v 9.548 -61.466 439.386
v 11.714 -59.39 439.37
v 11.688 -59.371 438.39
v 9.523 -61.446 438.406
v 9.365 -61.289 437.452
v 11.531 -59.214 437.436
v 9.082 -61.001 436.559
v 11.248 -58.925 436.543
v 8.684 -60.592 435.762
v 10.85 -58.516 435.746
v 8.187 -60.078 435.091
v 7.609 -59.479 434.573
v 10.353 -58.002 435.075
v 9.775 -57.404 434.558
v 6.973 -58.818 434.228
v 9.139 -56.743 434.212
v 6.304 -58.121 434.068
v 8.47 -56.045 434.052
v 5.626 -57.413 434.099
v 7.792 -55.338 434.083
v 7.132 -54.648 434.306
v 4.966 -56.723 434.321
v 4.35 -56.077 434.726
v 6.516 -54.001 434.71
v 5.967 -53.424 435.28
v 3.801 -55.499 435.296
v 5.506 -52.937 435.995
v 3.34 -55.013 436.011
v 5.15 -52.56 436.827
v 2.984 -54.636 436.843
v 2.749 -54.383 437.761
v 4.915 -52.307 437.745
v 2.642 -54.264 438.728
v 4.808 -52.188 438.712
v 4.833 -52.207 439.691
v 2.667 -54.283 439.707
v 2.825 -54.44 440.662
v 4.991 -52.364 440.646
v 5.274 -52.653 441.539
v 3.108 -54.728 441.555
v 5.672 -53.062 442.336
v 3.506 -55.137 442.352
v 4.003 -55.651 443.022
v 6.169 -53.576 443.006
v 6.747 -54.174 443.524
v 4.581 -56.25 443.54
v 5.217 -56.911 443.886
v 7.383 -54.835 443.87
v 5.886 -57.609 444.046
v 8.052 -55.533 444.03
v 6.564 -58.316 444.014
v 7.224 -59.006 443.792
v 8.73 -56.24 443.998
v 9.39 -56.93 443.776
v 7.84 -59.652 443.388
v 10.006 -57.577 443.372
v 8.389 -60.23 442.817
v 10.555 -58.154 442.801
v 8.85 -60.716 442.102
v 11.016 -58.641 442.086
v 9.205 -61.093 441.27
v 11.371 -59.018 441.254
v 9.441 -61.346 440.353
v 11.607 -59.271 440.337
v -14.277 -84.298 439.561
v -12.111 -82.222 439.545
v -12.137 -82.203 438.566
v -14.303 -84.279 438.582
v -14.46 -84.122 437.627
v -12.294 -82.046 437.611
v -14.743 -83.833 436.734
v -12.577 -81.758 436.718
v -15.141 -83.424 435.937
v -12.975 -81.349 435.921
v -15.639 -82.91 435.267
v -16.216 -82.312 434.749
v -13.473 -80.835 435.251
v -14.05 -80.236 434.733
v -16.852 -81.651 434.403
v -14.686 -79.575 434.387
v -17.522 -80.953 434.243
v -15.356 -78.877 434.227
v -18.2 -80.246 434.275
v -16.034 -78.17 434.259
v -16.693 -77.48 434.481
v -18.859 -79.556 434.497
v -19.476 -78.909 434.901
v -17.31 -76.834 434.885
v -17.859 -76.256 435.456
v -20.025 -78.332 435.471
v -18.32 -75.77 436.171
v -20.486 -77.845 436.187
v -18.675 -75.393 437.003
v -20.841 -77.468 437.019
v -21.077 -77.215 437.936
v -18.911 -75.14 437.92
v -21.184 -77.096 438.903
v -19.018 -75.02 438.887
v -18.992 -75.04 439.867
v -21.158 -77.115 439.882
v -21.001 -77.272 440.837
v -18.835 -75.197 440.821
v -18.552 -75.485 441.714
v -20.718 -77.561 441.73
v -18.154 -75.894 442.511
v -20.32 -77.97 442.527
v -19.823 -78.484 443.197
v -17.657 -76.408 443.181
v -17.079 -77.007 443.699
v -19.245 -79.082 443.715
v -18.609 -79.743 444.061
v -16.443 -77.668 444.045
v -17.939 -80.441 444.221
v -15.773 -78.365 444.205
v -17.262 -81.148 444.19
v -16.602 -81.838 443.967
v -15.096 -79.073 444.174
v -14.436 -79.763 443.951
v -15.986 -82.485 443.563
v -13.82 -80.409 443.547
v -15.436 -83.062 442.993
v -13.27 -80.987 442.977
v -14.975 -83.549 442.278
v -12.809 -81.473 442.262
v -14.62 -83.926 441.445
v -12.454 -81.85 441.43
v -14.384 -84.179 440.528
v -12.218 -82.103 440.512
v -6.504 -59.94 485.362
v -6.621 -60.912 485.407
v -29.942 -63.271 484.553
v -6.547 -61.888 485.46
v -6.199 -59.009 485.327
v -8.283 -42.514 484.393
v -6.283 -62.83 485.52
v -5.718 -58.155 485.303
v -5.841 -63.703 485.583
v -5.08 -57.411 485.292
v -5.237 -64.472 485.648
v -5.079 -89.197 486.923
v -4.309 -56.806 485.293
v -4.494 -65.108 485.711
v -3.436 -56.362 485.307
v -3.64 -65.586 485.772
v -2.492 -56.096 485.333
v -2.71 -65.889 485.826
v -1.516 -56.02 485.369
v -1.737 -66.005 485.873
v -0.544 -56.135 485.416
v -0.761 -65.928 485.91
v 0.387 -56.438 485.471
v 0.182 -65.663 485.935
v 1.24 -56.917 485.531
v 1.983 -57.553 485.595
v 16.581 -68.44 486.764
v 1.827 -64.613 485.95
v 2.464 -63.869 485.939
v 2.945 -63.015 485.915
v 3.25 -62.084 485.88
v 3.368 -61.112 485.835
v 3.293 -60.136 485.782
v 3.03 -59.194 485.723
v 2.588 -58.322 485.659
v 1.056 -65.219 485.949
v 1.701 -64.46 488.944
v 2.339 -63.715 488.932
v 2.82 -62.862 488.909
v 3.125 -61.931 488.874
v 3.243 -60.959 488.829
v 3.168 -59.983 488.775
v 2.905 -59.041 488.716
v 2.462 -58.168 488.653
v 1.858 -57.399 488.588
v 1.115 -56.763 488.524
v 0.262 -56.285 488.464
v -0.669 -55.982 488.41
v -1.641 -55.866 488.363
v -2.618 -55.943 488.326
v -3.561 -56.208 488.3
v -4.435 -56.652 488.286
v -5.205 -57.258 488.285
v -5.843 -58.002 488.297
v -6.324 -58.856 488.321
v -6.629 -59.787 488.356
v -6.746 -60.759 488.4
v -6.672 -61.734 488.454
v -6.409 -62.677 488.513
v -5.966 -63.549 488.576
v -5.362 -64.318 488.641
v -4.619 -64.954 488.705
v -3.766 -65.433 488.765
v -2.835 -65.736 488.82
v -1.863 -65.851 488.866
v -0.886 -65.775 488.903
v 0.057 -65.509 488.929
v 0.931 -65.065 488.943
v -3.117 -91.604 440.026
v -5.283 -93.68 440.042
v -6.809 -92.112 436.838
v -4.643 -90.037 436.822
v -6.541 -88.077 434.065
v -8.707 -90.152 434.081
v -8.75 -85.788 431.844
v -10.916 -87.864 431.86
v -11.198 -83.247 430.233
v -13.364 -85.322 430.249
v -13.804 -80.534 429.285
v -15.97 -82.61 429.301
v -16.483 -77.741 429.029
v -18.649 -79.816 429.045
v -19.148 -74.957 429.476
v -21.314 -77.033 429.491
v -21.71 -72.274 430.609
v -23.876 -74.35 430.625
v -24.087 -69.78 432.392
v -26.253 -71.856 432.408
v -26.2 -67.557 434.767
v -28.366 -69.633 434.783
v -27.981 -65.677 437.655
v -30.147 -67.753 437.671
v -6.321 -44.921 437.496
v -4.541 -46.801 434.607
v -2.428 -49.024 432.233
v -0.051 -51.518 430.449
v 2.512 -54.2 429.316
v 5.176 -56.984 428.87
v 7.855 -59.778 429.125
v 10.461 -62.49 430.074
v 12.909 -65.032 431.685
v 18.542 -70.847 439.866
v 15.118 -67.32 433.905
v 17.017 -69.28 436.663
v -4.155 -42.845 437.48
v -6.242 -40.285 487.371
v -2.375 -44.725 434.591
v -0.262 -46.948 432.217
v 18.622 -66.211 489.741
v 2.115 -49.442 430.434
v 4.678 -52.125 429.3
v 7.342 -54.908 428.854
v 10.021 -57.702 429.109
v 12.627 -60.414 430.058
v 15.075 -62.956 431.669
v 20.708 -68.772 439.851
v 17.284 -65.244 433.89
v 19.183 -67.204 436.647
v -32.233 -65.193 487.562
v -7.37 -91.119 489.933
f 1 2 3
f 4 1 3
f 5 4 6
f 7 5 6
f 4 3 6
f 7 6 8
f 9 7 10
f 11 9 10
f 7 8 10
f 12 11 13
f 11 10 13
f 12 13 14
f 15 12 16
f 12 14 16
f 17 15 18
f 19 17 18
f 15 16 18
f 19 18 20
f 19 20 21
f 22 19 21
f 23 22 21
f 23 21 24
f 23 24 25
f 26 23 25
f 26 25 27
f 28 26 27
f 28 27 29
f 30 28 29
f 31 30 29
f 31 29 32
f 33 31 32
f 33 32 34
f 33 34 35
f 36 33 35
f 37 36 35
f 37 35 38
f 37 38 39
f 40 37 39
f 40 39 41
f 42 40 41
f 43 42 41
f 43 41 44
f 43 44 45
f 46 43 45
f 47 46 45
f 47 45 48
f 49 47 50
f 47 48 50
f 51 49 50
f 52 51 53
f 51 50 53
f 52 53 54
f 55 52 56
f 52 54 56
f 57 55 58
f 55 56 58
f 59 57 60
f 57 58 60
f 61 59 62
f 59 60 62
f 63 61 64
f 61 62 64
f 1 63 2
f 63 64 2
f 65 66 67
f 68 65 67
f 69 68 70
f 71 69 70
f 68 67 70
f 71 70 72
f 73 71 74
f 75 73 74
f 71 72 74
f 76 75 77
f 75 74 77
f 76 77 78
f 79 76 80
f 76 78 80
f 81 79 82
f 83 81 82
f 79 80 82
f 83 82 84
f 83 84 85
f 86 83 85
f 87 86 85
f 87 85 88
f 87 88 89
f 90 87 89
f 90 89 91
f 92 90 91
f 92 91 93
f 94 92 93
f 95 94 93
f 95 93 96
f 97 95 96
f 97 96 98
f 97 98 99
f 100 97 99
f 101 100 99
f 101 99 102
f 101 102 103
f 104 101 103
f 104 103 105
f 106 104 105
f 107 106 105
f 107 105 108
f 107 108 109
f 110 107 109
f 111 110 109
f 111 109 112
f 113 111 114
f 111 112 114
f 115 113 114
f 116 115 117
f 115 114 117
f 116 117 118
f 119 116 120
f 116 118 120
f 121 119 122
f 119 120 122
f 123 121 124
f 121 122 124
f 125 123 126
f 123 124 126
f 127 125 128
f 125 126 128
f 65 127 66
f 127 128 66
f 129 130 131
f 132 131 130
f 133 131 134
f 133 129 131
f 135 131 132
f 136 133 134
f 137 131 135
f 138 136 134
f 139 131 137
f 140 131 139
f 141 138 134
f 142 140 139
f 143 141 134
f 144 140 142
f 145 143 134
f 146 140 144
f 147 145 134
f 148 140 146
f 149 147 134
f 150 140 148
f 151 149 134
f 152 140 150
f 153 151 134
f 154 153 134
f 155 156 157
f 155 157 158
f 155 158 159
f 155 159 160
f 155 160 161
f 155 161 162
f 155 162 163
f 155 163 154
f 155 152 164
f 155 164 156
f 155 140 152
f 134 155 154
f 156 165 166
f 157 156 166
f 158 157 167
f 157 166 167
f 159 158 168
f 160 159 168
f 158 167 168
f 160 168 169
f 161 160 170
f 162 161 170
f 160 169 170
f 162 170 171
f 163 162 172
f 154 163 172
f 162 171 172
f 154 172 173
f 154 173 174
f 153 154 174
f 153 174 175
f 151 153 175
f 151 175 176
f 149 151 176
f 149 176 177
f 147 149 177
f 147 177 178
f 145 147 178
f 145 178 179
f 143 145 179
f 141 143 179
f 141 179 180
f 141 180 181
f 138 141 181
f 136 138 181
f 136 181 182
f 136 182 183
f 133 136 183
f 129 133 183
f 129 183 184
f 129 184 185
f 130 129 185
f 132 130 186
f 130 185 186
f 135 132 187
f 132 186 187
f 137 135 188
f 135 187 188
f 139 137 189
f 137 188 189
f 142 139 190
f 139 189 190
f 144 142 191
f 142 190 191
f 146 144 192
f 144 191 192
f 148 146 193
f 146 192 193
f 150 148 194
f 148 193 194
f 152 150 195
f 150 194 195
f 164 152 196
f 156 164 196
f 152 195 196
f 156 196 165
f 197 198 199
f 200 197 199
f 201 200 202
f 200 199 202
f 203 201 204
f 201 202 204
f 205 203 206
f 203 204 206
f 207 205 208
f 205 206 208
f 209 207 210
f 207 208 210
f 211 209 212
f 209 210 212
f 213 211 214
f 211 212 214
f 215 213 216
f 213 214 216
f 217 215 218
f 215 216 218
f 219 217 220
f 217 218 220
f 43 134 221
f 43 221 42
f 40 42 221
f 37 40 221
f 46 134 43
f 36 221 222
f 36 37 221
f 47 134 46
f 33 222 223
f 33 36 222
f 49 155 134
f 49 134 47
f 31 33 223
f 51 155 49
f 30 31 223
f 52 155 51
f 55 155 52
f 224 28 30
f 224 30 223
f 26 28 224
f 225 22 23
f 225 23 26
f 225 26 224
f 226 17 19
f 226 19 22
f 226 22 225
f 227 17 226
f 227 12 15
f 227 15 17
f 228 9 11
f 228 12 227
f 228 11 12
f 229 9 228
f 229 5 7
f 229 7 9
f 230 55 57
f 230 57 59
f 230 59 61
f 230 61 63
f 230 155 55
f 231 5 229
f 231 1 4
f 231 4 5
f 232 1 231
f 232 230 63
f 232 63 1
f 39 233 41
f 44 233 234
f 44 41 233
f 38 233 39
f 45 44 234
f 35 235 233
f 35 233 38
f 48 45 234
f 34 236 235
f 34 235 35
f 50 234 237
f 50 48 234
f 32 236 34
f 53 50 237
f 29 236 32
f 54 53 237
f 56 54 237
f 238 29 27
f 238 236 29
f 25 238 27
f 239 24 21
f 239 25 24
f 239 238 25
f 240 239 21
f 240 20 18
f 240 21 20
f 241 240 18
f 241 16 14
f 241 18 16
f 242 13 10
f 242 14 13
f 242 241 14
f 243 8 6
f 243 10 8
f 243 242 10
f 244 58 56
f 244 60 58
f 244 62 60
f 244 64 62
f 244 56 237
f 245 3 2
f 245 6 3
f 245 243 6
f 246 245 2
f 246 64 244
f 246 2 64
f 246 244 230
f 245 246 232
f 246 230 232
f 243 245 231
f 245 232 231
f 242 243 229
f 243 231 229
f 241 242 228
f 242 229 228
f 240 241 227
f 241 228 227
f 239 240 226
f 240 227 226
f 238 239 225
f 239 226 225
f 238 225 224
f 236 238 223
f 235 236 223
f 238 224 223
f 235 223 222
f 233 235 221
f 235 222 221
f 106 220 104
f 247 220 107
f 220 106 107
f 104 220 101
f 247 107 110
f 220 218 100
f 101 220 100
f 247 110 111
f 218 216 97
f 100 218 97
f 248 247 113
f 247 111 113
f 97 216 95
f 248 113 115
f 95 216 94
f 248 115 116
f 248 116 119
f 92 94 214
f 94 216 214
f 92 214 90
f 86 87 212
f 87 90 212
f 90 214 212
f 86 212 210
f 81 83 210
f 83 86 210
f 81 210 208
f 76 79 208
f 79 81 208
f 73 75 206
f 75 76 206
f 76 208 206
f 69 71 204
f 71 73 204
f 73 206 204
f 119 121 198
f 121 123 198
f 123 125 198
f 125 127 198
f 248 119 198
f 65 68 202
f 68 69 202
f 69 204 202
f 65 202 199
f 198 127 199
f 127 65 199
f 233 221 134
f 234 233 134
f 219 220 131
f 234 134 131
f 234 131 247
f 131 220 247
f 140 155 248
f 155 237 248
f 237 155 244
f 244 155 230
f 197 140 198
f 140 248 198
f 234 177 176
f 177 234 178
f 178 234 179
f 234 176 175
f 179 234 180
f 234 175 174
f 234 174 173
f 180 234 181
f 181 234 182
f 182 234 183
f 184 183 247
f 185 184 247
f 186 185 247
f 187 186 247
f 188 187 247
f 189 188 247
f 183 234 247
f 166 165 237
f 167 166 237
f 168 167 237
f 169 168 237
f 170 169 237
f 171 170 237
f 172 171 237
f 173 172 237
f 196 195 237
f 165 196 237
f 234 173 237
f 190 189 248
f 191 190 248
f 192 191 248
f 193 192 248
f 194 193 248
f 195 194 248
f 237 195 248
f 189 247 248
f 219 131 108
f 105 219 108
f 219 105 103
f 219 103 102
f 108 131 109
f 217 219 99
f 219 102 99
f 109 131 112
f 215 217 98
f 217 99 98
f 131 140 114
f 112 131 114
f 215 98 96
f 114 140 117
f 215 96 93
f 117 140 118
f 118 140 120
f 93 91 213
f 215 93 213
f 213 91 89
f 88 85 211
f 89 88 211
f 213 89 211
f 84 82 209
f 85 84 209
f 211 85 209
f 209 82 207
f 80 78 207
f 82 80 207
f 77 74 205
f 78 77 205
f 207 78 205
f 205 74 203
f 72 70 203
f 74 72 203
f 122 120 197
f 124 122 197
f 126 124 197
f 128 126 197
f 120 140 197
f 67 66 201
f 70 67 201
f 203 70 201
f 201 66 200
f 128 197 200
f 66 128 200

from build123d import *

# Parameters (mm, degrees)
PAD002_DEPTH            = 36
SKETCH006_W             = 69.825363
SKETCH006_H             = 30
POCKET002_DEPTH         = 36.001
SKETCH007_R             = 5
POCKET003_DEPTH         = 36.001
SKETCH008_R             = 5
POCKET004_DEPTH         = 5
BODY002_ROLL_ANGLE      = -90.304991
BODY002_PITCH_ANGLE     = -3.775431
BODY002_PLACEMENT_ANGLE = -46.199273


with BuildPart() as part:
    # Sketch005 → Pad002 (new body)
    with BuildSketch(Plane.XY):
        with BuildLine():
            Line((-18, 0), (18, 0))
            Line((18, 0), (18, 50))
            ThreePointArc((18, 50), (0, 59.792689), (-18, 50))
            Line((-18, 50), (-18, 0))
        make_face()
    extrude(amount=PAD002_DEPTH)

    # Sketch006 (on Face2 of Pad002) → Pocket002 (cut, through all)
    with BuildSketch(Plane.YZ.offset(18)):
        with Locations((37.912681, 18)):
            Rectangle(SKETCH006_W, SKETCH006_H)
    extrude(amount=-POCKET002_DEPTH, mode=Mode.SUBTRACT)

    # Sketch007 (on Face5 of Pocket002) → Pocket003 (cut, through all)
    with BuildSketch(Plane.XY.offset(36)):
        with Locations((0, 49.623631)):
            Circle(SKETCH007_R)
    extrude(amount=-POCKET003_DEPTH, mode=Mode.SUBTRACT)

    # Sketch008 (on Face1 of Pocket003) → Pocket004 (cut)
    with BuildSketch(Plane.XZ):
        with Locations((0, 25)):
            Circle(SKETCH008_R)
    extrude(amount=-POCKET004_DEPTH, mode=Mode.SUBTRACT)


with BuildPart() as part_1:
    # Body002 roll: moved
    add(part.part.rotate(Axis((0, 0, 0), (1, 0, 0)), BODY002_ROLL_ANGLE))


with BuildPart() as part_2:
    # Body002 pitch: moved
    add(part_1.part.rotate(Axis((0, 0, 0), (0, 1, 0)), BODY002_PITCH_ANGLE))


with BuildPart() as part_3:
    # Body002 placement: moved
    add(part_2.part.moved(Location((-19.80148, -78.155877, 488.747301))).rotate(Axis((-19.80148, -78.155877, 488.747301), (0, 0, 1)), BODY002_PLACEMENT_ANGLE))


solid = part_3.part
